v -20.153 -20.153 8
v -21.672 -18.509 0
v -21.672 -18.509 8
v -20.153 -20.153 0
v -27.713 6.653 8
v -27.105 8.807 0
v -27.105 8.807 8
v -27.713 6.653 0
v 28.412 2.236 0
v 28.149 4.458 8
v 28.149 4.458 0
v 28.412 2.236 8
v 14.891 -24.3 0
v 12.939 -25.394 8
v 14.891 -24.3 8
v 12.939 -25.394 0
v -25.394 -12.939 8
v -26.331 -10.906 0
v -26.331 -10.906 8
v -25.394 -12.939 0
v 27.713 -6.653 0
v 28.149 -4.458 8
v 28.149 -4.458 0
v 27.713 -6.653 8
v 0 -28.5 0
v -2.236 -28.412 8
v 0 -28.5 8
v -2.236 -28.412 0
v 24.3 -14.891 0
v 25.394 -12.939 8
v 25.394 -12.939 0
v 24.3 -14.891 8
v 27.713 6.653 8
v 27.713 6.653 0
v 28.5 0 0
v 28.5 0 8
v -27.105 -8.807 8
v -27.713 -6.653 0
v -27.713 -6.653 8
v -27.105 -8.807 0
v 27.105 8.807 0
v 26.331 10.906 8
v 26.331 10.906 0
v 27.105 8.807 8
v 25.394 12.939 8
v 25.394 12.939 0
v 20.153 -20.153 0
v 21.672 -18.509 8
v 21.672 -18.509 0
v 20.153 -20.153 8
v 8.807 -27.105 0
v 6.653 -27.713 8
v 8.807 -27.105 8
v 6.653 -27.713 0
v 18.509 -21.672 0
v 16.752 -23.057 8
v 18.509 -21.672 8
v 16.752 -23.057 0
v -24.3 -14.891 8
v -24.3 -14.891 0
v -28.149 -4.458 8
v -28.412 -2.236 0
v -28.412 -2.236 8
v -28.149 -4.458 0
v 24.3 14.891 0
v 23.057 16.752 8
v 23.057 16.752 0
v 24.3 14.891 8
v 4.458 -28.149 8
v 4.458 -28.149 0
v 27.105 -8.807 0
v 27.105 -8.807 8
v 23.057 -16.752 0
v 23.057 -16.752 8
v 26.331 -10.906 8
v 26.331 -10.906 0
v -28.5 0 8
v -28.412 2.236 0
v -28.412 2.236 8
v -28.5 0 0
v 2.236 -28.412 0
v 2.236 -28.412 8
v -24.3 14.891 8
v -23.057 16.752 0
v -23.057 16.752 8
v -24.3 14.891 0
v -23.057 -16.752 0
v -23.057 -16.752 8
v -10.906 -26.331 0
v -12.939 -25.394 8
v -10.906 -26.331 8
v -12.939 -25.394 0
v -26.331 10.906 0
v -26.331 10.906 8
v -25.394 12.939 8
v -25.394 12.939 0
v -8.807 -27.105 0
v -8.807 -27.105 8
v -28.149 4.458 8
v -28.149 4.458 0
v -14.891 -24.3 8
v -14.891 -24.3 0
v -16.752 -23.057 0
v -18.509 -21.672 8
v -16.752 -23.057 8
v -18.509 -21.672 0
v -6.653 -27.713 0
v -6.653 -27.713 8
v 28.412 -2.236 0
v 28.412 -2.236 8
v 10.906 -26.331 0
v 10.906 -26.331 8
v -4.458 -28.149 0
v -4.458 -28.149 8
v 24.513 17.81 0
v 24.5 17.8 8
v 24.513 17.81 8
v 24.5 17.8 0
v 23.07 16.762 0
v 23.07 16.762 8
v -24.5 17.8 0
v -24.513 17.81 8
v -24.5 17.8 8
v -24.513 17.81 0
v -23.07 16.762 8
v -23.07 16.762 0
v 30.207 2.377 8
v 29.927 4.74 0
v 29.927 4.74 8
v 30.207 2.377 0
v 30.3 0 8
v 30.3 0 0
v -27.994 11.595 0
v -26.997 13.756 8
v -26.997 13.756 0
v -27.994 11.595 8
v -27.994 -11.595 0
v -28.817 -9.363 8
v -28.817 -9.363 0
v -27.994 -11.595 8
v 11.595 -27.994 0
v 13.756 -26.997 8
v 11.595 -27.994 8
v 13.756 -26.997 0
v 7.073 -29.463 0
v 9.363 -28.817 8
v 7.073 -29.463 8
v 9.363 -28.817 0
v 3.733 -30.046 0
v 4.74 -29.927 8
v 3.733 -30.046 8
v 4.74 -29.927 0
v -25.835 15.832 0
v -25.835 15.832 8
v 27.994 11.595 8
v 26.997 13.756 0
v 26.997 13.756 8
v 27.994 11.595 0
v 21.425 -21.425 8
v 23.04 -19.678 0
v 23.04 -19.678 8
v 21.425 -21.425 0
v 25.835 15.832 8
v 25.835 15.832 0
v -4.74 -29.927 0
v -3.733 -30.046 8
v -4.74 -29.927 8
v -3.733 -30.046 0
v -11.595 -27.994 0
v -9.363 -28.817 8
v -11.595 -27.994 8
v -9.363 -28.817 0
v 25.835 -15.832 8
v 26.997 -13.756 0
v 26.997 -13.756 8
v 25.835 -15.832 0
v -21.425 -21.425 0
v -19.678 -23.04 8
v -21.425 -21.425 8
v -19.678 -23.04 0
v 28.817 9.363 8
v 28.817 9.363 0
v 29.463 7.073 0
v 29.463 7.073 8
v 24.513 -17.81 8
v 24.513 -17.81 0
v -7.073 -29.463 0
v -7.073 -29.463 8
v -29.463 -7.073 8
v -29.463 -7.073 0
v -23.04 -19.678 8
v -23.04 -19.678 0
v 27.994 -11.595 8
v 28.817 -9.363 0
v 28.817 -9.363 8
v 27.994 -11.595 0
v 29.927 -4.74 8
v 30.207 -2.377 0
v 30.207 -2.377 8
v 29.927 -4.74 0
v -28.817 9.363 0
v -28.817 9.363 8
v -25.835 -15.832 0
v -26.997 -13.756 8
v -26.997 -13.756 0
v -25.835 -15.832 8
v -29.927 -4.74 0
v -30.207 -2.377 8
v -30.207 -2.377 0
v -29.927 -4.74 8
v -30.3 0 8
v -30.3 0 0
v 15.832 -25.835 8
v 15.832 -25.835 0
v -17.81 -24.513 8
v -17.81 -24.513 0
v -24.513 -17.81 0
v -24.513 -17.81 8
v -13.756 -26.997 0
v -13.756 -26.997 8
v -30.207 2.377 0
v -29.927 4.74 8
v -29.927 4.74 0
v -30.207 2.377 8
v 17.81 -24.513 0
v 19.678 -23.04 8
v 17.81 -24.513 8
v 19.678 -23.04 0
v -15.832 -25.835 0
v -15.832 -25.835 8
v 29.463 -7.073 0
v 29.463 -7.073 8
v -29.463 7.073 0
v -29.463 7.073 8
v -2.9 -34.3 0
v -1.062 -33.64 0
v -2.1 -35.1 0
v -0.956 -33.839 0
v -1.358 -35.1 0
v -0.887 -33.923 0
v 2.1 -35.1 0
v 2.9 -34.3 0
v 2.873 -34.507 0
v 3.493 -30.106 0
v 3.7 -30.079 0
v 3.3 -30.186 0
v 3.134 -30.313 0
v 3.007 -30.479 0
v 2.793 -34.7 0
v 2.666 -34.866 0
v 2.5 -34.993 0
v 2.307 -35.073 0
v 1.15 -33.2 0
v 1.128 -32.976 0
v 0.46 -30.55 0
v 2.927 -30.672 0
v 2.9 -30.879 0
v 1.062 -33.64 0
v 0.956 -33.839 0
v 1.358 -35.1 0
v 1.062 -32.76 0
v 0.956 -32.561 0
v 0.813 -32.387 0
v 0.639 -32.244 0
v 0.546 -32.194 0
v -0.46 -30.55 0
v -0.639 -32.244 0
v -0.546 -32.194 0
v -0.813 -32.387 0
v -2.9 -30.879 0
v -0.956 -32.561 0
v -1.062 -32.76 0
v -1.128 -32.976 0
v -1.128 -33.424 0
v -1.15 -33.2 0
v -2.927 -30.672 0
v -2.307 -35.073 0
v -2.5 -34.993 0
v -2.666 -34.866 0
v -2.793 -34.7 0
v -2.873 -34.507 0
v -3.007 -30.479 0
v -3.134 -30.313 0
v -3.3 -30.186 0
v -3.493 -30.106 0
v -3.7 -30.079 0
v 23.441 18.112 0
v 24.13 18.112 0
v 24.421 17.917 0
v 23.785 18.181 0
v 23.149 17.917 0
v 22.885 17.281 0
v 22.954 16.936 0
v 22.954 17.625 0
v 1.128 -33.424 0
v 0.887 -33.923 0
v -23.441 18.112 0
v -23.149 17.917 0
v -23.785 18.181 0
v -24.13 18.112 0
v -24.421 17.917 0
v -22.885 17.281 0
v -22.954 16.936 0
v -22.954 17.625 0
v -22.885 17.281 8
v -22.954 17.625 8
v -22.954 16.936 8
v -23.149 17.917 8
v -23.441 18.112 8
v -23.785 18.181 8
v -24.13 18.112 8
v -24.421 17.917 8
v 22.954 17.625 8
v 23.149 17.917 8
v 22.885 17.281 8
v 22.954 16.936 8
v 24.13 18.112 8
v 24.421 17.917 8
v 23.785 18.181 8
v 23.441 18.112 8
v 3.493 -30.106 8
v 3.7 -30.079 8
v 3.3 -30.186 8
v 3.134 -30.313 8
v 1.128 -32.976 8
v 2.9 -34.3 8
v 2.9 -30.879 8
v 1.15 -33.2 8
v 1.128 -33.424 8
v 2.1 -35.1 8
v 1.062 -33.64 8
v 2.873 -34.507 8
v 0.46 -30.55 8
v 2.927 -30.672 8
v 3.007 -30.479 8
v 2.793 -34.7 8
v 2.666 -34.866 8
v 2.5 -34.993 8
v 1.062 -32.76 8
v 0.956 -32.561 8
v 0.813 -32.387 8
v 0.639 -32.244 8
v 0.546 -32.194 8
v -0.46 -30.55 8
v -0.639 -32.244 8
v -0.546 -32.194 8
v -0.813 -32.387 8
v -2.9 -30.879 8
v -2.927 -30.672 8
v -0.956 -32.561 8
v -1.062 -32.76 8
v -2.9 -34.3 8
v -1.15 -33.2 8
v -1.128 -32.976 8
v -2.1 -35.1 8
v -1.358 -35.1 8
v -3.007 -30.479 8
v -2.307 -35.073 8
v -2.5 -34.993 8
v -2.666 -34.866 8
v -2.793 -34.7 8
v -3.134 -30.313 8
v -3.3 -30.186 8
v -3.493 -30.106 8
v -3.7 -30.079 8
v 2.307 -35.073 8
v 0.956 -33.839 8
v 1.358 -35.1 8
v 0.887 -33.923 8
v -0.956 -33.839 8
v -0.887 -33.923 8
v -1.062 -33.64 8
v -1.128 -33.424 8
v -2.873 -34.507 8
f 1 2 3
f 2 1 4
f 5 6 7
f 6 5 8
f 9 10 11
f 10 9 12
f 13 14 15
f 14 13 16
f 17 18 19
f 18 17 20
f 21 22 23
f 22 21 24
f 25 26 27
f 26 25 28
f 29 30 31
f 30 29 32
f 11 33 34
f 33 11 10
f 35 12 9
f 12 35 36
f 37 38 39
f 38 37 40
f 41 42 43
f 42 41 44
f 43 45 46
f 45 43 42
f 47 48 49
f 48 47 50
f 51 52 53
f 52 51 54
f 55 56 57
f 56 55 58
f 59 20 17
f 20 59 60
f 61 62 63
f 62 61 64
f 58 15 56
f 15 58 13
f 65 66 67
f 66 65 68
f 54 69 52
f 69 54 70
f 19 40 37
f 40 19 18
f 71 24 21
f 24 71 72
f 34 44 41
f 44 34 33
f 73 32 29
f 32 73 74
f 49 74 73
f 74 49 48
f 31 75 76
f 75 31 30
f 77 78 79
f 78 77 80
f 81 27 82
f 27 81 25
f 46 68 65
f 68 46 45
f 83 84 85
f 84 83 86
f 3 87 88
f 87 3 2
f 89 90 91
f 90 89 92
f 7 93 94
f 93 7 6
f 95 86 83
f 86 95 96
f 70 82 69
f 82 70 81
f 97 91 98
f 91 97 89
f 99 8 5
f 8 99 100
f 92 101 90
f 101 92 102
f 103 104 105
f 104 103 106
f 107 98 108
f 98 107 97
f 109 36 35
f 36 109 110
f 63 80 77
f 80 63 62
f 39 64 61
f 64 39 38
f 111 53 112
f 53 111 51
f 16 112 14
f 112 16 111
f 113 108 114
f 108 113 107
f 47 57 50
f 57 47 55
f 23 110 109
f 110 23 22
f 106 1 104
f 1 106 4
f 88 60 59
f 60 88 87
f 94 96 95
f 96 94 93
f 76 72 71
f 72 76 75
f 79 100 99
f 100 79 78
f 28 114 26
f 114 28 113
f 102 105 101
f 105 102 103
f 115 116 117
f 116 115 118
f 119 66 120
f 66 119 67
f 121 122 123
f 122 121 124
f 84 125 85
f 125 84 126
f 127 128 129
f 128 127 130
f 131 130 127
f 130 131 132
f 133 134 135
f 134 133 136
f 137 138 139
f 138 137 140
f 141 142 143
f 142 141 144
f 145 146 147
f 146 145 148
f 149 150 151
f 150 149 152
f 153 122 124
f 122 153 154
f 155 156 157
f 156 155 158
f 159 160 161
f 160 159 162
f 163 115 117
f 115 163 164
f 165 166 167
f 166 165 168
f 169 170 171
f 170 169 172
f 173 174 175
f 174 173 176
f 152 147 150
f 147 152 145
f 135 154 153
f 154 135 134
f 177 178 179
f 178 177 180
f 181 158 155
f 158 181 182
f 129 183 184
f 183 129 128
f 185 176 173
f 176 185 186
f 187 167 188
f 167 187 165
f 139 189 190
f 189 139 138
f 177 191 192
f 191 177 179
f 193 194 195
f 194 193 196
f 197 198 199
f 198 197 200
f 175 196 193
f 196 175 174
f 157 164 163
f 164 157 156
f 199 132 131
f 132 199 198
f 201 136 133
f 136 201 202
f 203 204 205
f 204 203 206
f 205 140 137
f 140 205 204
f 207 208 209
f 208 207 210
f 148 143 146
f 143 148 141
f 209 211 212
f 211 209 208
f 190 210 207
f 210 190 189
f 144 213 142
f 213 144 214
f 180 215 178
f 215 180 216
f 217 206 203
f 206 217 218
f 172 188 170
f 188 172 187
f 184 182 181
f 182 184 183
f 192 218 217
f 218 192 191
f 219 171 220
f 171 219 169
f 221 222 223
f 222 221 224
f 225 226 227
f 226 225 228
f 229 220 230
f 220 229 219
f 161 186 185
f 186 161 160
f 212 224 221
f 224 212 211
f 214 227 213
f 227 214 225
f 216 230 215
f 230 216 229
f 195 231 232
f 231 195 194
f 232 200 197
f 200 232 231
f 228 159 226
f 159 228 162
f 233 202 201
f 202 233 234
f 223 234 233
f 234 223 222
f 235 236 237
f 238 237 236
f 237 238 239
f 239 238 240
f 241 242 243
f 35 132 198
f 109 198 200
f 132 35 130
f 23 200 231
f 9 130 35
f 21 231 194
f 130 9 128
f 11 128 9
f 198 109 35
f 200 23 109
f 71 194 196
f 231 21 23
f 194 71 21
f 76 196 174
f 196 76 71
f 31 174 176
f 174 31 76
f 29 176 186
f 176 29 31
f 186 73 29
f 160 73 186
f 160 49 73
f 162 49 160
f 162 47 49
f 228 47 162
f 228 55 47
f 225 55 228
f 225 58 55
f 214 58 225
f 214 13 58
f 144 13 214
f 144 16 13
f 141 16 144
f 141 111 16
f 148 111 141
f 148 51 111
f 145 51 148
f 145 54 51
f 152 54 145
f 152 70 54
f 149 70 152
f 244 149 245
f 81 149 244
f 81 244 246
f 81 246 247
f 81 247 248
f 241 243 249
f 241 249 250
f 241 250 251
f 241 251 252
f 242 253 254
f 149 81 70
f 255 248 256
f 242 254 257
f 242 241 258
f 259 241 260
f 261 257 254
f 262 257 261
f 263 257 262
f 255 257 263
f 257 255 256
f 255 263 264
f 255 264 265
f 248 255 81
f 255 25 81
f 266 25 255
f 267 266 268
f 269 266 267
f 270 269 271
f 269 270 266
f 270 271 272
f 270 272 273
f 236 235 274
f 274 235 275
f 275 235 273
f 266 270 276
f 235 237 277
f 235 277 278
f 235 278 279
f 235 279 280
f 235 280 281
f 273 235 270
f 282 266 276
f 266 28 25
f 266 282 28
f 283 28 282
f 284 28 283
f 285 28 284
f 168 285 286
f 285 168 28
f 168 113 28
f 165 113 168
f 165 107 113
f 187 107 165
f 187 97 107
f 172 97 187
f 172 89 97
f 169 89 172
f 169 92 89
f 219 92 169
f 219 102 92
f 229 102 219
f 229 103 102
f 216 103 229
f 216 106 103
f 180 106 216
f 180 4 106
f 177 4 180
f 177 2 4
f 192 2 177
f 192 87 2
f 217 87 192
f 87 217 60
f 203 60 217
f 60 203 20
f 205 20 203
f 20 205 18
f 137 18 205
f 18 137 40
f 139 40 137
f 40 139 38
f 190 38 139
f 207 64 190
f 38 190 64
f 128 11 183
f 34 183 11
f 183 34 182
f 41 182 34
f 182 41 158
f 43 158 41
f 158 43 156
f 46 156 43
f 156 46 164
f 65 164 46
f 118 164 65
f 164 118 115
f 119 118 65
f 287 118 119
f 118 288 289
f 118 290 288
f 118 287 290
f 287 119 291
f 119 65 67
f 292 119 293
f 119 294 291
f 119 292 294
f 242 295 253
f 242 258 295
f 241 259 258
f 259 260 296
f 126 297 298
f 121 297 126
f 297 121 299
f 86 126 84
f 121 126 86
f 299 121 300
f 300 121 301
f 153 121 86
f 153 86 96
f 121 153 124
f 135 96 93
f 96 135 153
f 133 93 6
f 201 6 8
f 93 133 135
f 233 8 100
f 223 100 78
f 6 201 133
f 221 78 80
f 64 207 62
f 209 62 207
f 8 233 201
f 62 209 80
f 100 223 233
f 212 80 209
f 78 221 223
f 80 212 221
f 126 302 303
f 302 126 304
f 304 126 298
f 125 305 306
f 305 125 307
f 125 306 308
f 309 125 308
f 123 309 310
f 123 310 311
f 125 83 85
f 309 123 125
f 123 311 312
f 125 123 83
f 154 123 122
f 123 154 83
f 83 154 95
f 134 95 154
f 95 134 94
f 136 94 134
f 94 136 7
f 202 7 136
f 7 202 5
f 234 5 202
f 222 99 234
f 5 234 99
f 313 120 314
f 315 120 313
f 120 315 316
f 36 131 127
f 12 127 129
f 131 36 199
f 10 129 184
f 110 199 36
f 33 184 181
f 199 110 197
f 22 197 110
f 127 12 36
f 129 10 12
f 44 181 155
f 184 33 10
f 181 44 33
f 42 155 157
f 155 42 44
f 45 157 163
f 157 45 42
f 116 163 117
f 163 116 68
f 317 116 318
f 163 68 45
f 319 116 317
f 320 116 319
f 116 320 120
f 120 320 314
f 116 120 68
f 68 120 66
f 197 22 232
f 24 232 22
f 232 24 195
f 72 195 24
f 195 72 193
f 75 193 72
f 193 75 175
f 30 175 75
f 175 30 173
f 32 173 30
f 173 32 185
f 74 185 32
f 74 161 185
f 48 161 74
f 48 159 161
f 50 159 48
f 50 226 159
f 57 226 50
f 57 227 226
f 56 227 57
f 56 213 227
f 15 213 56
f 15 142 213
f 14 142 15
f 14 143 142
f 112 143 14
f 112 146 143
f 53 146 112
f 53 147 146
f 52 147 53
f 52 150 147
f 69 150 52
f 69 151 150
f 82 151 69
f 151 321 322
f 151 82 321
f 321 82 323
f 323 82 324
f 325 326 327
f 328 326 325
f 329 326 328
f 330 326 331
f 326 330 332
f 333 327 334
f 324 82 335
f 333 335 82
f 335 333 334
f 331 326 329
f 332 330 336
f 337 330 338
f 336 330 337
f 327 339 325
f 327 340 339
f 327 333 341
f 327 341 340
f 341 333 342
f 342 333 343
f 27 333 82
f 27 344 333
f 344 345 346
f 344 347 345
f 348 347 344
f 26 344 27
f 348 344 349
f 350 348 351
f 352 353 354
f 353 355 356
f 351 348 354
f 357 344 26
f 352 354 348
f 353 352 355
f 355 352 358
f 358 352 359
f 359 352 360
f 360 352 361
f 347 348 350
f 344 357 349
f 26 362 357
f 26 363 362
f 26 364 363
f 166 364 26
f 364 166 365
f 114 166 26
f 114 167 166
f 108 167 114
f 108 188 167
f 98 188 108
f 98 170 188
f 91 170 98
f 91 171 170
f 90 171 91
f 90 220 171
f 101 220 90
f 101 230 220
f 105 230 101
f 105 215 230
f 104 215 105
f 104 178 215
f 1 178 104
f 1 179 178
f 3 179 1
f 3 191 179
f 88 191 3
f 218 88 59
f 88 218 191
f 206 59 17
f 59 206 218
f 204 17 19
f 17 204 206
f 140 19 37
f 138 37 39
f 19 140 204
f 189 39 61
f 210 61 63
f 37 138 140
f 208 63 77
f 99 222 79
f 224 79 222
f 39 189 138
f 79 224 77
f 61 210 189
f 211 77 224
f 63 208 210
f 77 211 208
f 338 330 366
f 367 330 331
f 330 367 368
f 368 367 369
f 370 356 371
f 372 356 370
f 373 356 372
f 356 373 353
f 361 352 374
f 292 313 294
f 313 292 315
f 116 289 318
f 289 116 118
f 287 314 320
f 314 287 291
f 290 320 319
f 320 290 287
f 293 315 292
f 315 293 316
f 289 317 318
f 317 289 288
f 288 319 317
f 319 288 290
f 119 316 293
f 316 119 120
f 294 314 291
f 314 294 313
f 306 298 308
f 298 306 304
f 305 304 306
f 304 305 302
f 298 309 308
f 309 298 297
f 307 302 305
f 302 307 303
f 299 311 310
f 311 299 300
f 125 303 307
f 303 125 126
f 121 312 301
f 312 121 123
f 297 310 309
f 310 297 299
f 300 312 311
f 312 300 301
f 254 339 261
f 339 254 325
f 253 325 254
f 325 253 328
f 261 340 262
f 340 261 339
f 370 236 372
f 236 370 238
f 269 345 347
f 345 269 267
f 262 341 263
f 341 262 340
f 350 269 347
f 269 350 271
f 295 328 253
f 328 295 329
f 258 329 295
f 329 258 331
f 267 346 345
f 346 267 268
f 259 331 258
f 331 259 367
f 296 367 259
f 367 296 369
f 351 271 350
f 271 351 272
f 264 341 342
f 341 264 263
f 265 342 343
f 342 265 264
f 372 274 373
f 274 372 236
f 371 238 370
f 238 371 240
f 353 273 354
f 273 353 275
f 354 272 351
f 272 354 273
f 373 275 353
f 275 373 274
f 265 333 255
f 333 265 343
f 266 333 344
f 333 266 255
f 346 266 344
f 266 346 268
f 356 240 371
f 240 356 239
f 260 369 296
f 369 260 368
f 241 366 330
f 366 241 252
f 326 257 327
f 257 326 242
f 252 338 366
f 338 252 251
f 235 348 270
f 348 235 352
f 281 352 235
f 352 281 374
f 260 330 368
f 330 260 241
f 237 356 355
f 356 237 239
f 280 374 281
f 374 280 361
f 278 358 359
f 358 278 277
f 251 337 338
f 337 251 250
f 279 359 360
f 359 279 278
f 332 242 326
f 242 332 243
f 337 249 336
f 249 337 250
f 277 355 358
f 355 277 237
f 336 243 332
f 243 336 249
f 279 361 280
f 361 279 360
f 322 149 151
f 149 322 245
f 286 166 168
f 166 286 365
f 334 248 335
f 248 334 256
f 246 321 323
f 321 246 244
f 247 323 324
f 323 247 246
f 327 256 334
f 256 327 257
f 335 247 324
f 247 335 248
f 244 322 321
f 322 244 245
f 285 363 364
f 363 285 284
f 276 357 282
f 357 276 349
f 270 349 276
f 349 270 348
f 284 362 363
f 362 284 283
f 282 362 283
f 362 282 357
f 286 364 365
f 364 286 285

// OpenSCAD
/* Customizable Spray Can Straw Holder
 * By DrLex, v3.1 2024/10
 * Thingiverse thing:1707976
 * Released under Creative Commons - Attribution license */

/* [Dimensions (all in mm)] */
// Type of holder: 'clamp' yields a circle segment that grabs the can by itself; 'taped' yields a small holder that must be attached to the can with one or two strips of adhesive tape.
type = "clamp"; //[clamp,taped]

// Diameter of the can. For the 'clamp' type holder, you may want to use a value that is slightly too small, to give the holder extra clamping force.
can_dia = 57.0; //[40:0.1:80]

// Height of the holder. For the 'taped' type, you should use the width of your strip of tape.
height = 8.0; //[3:0.1:32]

// Diameter of the straw hole. The ideal value will depend on your printer, print settings, and filament. Try out a few values and print the final model with what works best.
straw_dia = 2.30; //[1:0.01:4]

// Thickness of the holder walls. Preferably set this to a value that will yield exactly an integer number of perimeters.
thickness = 1.8; //[0.8:0.01:3]

// Add a chamfer to the hole. This makes it easier to insert the straw, especially for the 'taped' model if you're going to attach it with a single strip of tape that blocks the gap in the front.
chamfer = "no"; //[no,yes]

/* [Advanced] */

// The angle for the opening in the clamp (only for 'clamp' shape). Zero produces a half circle which will obviously not clamp at all, 90 produces a full circle which you could only slide onto the can if there is nothing in the way. The default has been tested to work well, so you probably should not change this.
opening_angle = 36; //[0:1:90]

// Number of segments (detail) for the model.
segments = 80; //[32:128]


/* [Hidden] */
rounding = 0.8;
inner_radius = can_dia / 2;
straw_r = straw_dia / 2;

outer_radius = inner_radius + thickness;
mid_radius = (inner_radius + outer_radius)/2;

cut_x = (outer_radius + 2) * cos(opening_angle);
cut_y = (outer_radius + 2) * sin(opening_angle);
r_x = mid_radius * cos(opening_angle);
r_y = mid_radius * sin(opening_angle);

block_w = straw_dia + 3.5;
block_x = block_w/2 - rounding;
xtra_y = straw_dia < 2.6 ? 0 : (straw_dia-2.6)/2;
block_y = outer_radius + 2.5 + straw_dia + xtra_y - rounding;
straw_y = outer_radius + 0.6 + straw_dia;

if(type == "clamp") {
    difference() {
        cylinder(h=height, r=outer_radius, $fn=segments);
        translate([0,0,-1]) {
            cylinder(h=height+2, r=inner_radius, $fn=segments);
            if(opening_angle < 90) {
                linear_extrude(height+2) polygon([[0, 0], [cut_x, cut_y], [cut_x, cut_y + outer_radius], [-cut_x, cut_y + outer_radius], [-cut_x, cut_y]]);
            }
        }
    }
    if(opening_angle < 90) {
        translate([r_x, r_y, 0]) cylinder(r=thickness/2, h=height, $fn=16);
        translate([-r_x, r_y, 0]) cylinder(r=thickness/2, h=height, $fn=16);
    }
}
else {
    touch_x = cos(60) * (inner_radius+rounding);
    touch_y = sin(60) * (inner_radius+rounding);
    block_x2 = block_x + rounding*2 + .4;
    block_w2 = block_w + .8;
    difference() {
        hull() {
            translate([-touch_x, -touch_y, 0]) cylinder(h=height, r=rounding, $fn=24);
            translate([touch_x, -touch_y, 0]) cylinder(h=height, r=rounding, $fn=24);
            translate([block_x2, -block_y, 0]) cylinder(h=height, r=rounding, $fn=24);
            translate([-block_x2, -block_y, 0]) cylinder(h=height, r=rounding, $fn=24);
        }
        translate([0, -(outer_radius + block_w2/2), height/2]) cube([block_w2, block_w2, height+1], center=true);
        translate([0,0,-1]) {
            cylinder(h=height+2, r=inner_radius, $fn=segments);
        }
    }
}

difference() {
    hull() {
        translate([block_x, -block_y, 0]) cylinder(h=height, r=rounding, $fn=24);
        translate([-block_x, -block_y, 0]) cylinder(h=height, r=rounding, $fn=24);
        translate([0, -mid_radius, height/2]) cube([block_w, 0.1, height], center=true);
    }

    translate([0, -straw_y, -1]) {
        cylinder(h=height + 2, r=straw_r, $fn=32);
        linear_extrude(height + 2, convexity=4)
            polygon([[0.2*straw_dia, straw_dia + 0.35], [0.26*straw_dia, 0], [straw_dia, -1.85*straw_dia],
                    [-straw_dia, -1.85*straw_dia], [-0.26*straw_dia, 0], [-0.2*straw_dia, straw_dia + 0.35]]);
    }

    if(chamfer == "yes") {
        translate([0, -straw_y, height-straw_r-rounding]) cylinder(h=straw_dia+rounding, r1=0, r2=straw_dia+rounding, $fn=32); 
        translate([0, -straw_y, -straw_r]) cylinder(h=straw_dia+rounding, r2=0, r1=straw_dia+rounding, $fn=32); 
    }
}

// Finishing touches
if(type == "clamp") {
    // Round the connection between the circle and the block
    round_y = sqrt(pow(outer_radius + rounding, 2) - pow(block_w/2 + rounding, 2));
    ft_x = block_w/2 - .1;
    ft_y = round_y + .1;
    difference() {
        linear_extrude(height, convexity=4) {
            polygon([[ft_x, -ft_y], [ft_x, -mid_radius], [block_w/2 + round_y - mid_radius, -mid_radius]]);
            polygon([[-ft_x, -ft_y], [-ft_x, -mid_radius], [-(block_w/2 + round_y - mid_radius), -mid_radius]]);
        }
        translate([block_w/2 + rounding, -round_y, height/2]) cylinder(h=height+2, r=rounding, center=true, $fn=24);
        translate([-block_w/2 - rounding, -round_y, height/2]) cylinder(h=height+2, r=rounding, center=true, $fn=24);
    }
}
